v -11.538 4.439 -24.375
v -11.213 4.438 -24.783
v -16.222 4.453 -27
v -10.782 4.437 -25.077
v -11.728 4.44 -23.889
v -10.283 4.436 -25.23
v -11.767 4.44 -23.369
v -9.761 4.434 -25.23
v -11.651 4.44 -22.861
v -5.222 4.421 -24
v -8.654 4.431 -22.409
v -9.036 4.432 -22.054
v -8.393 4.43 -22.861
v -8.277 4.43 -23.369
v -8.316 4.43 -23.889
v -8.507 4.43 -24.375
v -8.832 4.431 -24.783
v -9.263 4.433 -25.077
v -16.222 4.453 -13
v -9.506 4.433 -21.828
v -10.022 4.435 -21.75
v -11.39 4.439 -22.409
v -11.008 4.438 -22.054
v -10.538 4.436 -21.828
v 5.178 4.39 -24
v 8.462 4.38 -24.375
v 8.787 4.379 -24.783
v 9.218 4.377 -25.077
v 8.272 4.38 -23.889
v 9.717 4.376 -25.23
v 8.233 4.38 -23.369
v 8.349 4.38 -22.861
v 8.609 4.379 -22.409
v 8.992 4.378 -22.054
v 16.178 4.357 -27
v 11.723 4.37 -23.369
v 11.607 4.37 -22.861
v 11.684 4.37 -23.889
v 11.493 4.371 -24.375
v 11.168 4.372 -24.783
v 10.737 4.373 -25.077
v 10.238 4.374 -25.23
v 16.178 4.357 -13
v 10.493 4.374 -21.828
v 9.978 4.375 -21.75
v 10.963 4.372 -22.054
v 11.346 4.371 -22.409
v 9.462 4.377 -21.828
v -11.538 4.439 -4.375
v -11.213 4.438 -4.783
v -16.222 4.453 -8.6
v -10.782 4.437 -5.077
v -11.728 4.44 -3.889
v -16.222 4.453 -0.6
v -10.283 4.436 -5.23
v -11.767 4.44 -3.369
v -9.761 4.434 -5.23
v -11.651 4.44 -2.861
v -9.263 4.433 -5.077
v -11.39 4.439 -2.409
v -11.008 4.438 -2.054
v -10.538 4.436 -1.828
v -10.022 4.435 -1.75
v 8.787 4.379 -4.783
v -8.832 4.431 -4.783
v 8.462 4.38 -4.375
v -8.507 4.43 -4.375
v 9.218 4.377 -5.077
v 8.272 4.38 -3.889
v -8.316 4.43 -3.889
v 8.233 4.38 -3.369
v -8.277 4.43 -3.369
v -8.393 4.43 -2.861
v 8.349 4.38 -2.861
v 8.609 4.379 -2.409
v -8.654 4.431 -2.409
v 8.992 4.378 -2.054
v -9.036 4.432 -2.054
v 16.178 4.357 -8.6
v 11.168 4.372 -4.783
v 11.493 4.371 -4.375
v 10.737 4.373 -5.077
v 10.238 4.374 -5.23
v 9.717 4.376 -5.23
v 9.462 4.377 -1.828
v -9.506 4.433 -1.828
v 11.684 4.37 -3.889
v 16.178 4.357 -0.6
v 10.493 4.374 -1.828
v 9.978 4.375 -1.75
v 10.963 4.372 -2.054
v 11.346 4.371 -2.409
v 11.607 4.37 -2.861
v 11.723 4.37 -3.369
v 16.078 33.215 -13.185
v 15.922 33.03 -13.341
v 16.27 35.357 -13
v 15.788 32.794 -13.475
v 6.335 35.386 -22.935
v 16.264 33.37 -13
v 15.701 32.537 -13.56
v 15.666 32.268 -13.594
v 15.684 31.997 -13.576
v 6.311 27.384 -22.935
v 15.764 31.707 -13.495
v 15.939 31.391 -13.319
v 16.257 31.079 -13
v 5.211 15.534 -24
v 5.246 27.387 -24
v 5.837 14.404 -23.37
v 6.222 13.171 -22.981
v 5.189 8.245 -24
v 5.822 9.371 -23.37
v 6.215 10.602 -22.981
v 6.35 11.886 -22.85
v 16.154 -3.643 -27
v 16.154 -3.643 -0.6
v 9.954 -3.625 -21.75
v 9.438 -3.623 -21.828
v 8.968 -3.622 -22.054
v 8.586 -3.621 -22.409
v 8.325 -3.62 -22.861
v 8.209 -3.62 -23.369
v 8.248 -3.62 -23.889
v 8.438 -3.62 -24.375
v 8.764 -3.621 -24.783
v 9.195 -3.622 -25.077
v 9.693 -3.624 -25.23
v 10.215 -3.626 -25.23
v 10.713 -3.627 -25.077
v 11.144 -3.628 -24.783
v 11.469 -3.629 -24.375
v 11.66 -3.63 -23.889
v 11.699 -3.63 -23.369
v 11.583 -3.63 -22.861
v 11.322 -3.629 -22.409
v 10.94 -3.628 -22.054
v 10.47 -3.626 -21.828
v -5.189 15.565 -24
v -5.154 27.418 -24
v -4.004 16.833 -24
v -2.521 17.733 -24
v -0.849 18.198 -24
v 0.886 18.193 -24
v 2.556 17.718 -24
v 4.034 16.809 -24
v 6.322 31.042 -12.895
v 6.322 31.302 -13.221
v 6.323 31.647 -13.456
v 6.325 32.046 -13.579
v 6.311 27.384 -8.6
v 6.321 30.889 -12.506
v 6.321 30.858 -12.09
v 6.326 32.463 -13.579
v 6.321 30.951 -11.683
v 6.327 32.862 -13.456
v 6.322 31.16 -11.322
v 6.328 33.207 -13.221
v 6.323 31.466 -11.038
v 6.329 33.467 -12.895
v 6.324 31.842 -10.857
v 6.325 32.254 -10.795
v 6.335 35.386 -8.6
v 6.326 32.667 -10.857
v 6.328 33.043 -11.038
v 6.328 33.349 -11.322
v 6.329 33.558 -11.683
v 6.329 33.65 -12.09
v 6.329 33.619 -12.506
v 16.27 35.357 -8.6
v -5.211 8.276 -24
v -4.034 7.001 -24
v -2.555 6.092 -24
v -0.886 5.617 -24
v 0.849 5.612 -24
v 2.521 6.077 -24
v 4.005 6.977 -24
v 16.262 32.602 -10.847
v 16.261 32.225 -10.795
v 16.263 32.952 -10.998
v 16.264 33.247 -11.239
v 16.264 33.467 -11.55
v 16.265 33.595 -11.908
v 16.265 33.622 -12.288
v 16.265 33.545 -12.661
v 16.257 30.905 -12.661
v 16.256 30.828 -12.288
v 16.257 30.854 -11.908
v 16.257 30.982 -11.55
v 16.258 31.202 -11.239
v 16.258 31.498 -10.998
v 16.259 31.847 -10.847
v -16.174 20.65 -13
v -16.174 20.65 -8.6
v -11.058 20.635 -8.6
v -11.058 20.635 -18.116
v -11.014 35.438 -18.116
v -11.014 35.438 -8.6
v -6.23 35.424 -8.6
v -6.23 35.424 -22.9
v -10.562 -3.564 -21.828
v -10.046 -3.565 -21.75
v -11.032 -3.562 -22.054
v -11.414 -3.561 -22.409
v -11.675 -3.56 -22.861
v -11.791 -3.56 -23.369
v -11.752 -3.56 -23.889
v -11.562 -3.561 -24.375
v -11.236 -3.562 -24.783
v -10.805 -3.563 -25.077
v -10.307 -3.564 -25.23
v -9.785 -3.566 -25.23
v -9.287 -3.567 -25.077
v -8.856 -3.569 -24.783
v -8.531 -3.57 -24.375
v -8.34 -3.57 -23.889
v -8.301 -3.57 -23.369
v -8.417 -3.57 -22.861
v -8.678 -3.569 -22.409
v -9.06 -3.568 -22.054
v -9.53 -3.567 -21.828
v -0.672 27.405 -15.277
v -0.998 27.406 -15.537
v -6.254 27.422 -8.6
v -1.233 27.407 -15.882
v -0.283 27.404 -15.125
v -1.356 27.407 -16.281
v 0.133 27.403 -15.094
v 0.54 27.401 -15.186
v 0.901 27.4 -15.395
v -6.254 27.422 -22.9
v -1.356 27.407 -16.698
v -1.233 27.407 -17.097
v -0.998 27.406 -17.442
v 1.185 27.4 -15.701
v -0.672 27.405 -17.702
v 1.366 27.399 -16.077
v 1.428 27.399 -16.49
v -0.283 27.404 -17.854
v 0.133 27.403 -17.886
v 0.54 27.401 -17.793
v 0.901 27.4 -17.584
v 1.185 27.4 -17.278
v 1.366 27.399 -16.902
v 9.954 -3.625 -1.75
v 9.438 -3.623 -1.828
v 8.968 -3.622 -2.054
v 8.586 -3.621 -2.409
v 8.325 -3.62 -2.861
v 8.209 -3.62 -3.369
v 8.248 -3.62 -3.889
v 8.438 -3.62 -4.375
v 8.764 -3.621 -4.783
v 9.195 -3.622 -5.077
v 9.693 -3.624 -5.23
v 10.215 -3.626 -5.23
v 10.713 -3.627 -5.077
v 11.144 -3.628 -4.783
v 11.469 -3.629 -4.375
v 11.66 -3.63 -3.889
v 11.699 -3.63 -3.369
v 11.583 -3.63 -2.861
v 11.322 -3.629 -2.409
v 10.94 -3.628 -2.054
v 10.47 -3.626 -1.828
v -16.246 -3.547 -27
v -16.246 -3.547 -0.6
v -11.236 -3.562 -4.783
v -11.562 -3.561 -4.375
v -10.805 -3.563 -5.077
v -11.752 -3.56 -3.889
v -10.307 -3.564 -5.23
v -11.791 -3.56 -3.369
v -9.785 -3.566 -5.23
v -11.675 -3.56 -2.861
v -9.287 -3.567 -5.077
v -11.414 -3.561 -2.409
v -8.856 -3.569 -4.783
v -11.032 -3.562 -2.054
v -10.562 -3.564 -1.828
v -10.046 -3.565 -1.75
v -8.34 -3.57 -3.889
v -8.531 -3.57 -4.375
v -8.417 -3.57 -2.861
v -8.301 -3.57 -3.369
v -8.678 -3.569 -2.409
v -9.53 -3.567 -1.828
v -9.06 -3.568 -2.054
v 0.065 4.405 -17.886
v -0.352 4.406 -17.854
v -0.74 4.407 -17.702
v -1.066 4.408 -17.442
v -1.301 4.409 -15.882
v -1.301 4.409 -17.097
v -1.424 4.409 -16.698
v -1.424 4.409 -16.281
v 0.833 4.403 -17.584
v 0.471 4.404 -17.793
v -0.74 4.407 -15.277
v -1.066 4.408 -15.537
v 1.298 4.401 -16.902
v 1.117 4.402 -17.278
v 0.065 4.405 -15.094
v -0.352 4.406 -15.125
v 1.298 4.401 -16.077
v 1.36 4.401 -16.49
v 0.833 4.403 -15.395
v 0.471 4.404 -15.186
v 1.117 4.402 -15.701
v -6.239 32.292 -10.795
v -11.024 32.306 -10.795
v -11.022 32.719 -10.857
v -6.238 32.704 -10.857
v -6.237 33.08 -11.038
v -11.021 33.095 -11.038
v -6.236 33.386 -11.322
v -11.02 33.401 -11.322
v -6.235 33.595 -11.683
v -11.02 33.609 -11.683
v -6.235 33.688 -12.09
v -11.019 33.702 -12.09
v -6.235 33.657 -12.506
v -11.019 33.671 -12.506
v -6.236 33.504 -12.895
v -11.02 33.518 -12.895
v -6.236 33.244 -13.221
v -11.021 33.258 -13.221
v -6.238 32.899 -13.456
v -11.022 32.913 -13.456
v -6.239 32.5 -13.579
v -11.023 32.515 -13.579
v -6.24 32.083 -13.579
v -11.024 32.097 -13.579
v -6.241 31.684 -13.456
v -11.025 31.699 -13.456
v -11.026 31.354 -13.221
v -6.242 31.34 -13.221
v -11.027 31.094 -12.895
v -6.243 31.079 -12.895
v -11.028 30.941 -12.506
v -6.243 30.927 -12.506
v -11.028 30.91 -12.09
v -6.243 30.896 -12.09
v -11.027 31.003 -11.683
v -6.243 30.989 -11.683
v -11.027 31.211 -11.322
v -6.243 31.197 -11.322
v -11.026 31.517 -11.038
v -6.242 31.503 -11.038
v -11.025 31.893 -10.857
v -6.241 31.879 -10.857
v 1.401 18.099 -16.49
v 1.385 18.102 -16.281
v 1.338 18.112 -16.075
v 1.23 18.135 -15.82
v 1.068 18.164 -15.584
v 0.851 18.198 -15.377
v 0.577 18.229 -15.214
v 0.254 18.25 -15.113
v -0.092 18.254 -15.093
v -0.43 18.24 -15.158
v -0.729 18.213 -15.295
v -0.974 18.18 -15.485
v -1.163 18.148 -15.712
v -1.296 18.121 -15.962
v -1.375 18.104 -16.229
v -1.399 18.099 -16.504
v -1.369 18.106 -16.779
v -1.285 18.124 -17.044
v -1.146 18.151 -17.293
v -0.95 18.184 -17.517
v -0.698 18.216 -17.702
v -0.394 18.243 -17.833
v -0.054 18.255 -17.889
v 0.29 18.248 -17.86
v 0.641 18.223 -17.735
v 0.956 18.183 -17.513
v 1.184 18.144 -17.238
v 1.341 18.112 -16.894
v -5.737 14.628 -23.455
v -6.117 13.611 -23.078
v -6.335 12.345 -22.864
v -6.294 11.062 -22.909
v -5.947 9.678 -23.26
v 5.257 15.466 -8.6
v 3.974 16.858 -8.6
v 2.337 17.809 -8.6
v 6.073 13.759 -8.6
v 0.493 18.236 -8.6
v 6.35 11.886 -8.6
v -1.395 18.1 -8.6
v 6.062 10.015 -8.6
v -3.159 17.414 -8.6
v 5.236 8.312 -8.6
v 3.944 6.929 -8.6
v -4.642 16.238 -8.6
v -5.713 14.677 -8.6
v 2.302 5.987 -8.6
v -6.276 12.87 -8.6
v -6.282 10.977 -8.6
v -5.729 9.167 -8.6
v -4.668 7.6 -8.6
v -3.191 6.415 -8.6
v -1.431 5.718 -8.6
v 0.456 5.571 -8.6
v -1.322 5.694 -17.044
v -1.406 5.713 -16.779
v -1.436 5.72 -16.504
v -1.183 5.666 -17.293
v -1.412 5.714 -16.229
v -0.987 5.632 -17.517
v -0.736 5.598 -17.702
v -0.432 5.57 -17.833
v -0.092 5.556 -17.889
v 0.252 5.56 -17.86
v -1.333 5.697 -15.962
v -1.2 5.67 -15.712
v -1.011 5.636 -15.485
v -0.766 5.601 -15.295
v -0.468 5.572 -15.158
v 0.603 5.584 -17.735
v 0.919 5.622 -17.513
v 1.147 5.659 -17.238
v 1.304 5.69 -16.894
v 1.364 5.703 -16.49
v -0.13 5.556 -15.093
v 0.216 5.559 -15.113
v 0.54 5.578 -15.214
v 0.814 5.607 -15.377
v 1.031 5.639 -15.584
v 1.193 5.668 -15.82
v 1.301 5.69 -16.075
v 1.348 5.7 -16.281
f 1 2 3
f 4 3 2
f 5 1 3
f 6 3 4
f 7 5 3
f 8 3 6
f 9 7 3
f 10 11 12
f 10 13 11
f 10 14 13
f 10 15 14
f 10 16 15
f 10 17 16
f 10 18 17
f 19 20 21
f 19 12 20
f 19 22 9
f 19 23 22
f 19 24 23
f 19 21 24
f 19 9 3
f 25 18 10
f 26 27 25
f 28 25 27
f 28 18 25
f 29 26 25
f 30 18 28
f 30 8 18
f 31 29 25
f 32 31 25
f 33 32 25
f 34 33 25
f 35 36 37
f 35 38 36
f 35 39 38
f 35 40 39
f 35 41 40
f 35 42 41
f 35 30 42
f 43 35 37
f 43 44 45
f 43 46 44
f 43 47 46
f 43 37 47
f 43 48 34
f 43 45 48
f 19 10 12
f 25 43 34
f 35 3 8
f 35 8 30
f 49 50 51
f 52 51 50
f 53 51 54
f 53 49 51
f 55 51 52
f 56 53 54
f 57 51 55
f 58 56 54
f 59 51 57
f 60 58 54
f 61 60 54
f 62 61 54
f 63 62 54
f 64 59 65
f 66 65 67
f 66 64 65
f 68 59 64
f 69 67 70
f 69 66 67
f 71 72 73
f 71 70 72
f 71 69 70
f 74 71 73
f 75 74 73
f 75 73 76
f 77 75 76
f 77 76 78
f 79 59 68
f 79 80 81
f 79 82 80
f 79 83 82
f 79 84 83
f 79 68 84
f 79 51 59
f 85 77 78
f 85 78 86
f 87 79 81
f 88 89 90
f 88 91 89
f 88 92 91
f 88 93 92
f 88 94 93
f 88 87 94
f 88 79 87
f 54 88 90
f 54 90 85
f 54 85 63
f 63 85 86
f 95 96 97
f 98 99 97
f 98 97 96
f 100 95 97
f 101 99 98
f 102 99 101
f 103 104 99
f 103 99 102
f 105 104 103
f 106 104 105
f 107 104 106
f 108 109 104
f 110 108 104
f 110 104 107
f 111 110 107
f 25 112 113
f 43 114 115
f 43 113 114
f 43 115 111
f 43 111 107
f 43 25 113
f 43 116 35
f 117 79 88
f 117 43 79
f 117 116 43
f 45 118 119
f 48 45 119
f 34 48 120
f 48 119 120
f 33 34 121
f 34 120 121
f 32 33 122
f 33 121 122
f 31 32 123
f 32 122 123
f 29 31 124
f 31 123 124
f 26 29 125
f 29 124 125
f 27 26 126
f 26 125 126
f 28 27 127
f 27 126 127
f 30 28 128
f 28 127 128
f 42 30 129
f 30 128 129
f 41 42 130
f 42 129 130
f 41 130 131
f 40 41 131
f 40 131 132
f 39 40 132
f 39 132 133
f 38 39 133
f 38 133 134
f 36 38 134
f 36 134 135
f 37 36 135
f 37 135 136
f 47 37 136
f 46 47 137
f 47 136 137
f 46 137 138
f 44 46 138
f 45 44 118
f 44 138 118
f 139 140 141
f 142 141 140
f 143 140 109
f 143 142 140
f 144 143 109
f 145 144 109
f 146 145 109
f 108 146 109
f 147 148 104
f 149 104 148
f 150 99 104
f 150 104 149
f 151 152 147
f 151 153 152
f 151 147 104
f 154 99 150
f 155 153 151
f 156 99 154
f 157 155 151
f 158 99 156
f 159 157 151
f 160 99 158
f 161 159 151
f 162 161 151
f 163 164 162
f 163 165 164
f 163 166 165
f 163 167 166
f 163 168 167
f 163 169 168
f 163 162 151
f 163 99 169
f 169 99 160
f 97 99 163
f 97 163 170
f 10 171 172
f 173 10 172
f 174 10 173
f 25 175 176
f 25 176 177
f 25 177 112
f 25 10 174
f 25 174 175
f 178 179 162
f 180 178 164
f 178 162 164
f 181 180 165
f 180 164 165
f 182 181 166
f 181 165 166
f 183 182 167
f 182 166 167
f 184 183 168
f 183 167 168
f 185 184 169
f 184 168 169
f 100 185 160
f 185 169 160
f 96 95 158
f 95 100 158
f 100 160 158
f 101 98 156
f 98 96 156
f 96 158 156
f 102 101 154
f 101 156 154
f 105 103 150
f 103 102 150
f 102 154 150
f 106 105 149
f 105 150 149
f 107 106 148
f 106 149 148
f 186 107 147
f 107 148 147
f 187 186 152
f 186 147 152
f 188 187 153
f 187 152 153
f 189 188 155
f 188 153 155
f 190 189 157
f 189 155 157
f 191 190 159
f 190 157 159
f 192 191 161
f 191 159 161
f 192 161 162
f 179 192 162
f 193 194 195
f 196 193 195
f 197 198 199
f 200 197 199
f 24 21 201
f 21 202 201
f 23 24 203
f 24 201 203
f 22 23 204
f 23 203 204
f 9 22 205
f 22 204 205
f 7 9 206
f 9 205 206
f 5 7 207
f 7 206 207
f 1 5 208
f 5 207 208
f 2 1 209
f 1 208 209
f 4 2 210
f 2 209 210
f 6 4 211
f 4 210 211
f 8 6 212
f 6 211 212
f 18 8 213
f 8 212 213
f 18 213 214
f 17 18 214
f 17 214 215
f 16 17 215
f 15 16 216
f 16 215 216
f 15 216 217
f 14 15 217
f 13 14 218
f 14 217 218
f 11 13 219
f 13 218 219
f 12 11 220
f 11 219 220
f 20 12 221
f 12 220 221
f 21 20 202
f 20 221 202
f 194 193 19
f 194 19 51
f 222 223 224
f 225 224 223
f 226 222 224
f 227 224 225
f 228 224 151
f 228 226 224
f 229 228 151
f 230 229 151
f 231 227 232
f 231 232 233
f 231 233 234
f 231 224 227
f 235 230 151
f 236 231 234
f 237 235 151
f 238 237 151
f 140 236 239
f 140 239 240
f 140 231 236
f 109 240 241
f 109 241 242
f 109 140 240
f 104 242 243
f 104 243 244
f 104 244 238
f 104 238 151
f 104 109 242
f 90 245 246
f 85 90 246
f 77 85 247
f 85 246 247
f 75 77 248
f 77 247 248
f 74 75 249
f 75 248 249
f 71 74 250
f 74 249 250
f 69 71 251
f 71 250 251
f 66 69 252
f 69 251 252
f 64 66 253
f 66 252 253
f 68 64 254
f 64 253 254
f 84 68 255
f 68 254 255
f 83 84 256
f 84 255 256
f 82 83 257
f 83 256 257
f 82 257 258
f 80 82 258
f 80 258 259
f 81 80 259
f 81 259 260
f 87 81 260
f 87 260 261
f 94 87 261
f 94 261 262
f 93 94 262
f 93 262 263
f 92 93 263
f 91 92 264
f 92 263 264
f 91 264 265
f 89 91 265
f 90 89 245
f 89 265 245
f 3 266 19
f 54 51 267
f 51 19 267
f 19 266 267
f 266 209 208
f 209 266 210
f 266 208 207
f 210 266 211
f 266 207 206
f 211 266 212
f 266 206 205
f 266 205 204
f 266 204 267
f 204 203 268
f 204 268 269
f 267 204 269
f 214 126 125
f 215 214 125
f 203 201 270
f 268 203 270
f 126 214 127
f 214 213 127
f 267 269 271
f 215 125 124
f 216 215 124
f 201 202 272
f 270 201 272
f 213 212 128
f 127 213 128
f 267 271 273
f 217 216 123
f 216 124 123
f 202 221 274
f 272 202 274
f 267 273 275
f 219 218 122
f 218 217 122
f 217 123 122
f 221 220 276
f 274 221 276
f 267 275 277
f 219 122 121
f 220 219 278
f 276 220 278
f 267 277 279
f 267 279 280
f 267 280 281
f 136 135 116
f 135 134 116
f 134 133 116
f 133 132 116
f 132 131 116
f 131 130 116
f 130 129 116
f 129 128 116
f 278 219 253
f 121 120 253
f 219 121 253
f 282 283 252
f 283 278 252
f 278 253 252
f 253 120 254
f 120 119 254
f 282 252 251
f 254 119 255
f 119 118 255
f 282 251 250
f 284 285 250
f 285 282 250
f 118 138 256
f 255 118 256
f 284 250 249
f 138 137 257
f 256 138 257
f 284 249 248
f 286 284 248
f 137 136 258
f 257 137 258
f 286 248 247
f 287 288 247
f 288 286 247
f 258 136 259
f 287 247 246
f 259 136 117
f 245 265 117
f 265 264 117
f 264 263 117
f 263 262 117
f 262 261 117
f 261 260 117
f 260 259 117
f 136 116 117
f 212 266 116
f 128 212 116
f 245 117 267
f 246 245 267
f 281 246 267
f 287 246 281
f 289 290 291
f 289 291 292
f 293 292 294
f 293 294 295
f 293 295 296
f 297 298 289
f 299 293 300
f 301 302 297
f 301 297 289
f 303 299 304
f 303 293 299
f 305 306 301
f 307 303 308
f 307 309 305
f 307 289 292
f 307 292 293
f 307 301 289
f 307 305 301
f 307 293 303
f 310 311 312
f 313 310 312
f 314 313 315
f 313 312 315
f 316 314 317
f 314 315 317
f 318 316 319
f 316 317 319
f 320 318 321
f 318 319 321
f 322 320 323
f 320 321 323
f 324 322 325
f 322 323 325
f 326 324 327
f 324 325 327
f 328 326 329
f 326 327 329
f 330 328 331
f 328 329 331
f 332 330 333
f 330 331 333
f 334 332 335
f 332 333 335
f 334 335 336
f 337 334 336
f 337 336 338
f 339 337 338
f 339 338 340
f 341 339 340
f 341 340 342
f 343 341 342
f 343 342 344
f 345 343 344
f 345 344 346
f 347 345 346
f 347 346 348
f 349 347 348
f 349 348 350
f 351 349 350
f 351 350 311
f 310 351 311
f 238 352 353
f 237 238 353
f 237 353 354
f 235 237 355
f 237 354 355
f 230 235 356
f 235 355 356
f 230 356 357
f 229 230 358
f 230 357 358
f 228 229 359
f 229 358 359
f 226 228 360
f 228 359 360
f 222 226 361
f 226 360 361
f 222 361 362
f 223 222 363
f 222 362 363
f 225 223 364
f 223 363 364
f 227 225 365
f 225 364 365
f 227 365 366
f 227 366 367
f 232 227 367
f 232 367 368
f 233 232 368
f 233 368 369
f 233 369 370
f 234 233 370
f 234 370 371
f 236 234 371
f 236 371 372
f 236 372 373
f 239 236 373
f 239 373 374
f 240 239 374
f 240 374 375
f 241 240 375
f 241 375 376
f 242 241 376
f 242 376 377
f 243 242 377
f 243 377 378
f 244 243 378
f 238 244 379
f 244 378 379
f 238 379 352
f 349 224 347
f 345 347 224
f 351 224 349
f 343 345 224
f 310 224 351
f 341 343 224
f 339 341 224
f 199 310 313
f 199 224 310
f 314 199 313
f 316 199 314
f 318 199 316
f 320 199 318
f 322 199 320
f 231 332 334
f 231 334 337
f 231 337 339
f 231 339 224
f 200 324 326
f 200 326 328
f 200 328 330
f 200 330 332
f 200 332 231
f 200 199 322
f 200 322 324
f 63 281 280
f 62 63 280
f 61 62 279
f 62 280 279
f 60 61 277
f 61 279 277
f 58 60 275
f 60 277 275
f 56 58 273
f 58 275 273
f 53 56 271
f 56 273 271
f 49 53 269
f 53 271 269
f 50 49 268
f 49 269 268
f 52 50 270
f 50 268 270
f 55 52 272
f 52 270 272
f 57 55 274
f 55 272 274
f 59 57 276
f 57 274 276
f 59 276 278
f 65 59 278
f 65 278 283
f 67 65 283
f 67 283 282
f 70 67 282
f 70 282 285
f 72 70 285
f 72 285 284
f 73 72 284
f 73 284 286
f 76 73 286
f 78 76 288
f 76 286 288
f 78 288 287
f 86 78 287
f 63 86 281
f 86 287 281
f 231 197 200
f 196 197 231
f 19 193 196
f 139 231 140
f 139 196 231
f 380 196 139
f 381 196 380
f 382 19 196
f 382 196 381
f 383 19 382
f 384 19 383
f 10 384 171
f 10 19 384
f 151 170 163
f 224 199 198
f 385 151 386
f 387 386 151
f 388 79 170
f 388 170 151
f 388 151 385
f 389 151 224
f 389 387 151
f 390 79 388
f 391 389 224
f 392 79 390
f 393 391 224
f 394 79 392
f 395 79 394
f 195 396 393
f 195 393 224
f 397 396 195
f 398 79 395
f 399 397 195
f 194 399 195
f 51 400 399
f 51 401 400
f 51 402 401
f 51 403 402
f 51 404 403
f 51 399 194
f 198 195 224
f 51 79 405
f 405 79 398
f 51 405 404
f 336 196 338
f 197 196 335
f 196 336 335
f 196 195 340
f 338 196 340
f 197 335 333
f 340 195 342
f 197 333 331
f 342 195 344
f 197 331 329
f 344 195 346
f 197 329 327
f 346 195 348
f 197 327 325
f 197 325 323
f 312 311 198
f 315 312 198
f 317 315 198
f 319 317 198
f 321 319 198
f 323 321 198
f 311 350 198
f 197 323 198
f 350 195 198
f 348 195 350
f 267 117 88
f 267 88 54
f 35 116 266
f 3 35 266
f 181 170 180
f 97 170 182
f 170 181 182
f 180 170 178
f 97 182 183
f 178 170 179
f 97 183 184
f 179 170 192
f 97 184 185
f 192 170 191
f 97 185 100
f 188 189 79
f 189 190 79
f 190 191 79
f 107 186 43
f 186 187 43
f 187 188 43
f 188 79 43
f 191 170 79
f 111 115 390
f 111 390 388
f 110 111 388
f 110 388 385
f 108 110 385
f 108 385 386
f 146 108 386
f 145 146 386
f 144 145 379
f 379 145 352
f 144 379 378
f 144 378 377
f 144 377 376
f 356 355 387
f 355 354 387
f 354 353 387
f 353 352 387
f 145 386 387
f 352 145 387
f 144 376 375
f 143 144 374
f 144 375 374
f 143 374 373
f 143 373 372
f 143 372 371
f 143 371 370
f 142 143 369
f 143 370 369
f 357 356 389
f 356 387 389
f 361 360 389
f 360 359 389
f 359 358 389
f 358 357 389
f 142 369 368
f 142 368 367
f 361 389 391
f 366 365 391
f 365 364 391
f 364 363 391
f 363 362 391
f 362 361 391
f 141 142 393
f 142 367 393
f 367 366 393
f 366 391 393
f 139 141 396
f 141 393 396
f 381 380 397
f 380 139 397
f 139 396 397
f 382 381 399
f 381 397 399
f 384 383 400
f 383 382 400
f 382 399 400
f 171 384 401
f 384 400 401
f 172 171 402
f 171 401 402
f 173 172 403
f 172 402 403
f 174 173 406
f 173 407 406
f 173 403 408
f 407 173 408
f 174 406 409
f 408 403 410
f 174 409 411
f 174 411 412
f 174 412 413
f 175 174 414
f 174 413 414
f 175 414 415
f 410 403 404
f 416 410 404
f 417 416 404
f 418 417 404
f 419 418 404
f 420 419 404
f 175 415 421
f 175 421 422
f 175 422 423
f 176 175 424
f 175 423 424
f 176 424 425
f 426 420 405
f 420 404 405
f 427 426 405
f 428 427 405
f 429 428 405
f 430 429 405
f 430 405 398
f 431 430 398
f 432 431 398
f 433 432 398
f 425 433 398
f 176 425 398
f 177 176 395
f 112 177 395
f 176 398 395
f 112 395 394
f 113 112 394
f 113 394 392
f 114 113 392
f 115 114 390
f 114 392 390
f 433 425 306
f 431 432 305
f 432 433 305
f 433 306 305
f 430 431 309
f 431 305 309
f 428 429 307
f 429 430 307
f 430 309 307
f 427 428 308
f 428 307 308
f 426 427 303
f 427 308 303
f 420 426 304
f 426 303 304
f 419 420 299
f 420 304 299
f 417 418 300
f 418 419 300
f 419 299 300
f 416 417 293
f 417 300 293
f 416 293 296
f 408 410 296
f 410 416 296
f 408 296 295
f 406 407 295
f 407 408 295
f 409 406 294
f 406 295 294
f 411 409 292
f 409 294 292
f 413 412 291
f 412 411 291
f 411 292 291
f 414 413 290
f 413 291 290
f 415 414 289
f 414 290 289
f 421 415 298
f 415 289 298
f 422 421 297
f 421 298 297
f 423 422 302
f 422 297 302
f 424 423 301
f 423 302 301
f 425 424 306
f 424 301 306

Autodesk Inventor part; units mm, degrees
ref_plane "YZ Plane" through (0, 0, 0) normal (1, 0, 0) x (0, 1, 0)
ref_plane "Work Plane5" through (16.1538, -3.6432, -7.1) normal (0.0029789, 0.9999956, 0) x (0, 0, 1)
sketch "Sketch5" plane through (16.1538, -3.6432, -7.1) normal (0.0029789, 0.9999956, 0) x (0, 0, 1)
  circle A0 centre (-16.4, -26.2) radius 1.75 projected
  circle A1 centre (-16.4, -6.2) radius 1.75 projected
  line L0 (0, -32.4) -> (6.5, -32.4) projected
  line L1 (6.5, 0) -> (6.5, -32.4) projected
  line L2 (0, 0) -> (6.5, 0) projected
  line L3 (0, 0) -> (0, -32.4) projected
  circle A2 centre (3.6, -6.2) radius 1.75 projected
  circle A3 centre (3.6, -26.2) radius 1.75 projected
  line L4 (-19.9, 0) -> (-19.9, -32.4) projected
  line L5 (6.5, -32.4) -> (-19.9, -32.4)
  line L6 (-19.9, -32.4) -> (-19.9, 0)
  line L7 (-19.9, 0) -> (6.5, 0)
  line L8 (6.5, 0) -> (6.5, -32.4)
  point P0 (7.1, -16.1645)
extrude "Extrusion4" add sketch "Sketch5" along normal blind 8
sketch "Sketch7" plane through (16.1776, 4.3568, -7.1) normal (0.0029789, 0.9999956, 0) x (0.9999956, -0.0029789, 0)
  point P0 (-16.1645, -7.1)
sketch "Sketch8" plane through (16.1776, 4.3568, -7.1) normal (0.0029789, 0.9999956, 0) x (0.9999956, -0.0029789, 0)
  circle A0 centre (-26.2, -3.6) radius 1.75 projected
  circle A1 centre (-6.2, -3.6) radius 1.75 projected
  circle A2 centre (-6.2, 16.4) radius 1.75 projected
  circle A3 centre (-26.2, 16.4) radius 1.75 projected
  line L0 (-32.4, -6.5) -> (0, -6.5) projected
  line L1 (0, -6.5) -> (0, 19.9) projected
  line L2 (0, 19.9) -> (-32.4, 19.9) projected
  line L3 (-32.4, 19.9) -> (-32.4, -6.5) projected
  circle A4 centre (-16.2177, 39.3896) radius 1.75 projected
  line L4 (-22.2006, -0.6104) -> (-22.0458, -0.6104) projected
  line L5 (-22.2, -0.6104) -> (-22.2, -0.6104) projected
  line L6 (-22.2, -0.6104) -> (-21.7015, -0.6104) projected
  line L7 (-21.7015, -0.6104) -> (-14.6224, -0.6104) projected
  line L8 (-14.6224, -0.6104) -> (-13.8248, -0.6104) projected
  line L9 (-13.8248, -0.6104) -> (-10.7339, -0.6104) projected
  line L10 (-10.7339, -0.6104) -> (-10.2354, -0.6104) projected
  line L11 (-10.2354, -0.6104) -> (-10.2354, -0.6104) projected
  line L12 (-10.3901, -0.6104) -> (-10.2354, -0.6104) projected
  line L13 (-10.966, -0.6104) -> (-10.3901, -0.6104) projected
  line L14 (-11.1588, -0.6104) -> (-10.966, -0.6104) projected
  line L15 (-11.1588, -0.6104) -> (-11.5034, -0.6104) projected
  line L16 (-11.731, -0.6104) -> (-11.5034, -0.6104) projected
  line L17 (-11.731, -0.6104) -> (-11.731, -0.6104) projected
  line L18 (-11.731, -0.6104) -> (-11.5034, -0.6104) projected
  line L19 (-11.5034, -0.6104) -> (-11.1379, -0.6104) projected
  line L20 (-11.1379, -0.6104) -> (-10.9487, -0.6104) projected
  line L21 (-10.9487, -0.6104) -> (-10.3901, -0.6104) projected
  line L22 (-10.3901, -0.6104) -> (-10.2354, -0.6104) projected
  line L23 (-10.2354, -0.6104) -> (-10.2354, -0.6104) projected
  line L24 (-10.2354, -0.6104) -> (-10.7339, -0.6104) projected
  line L25 (-10.7339, -0.6104) -> (-21.7015, -0.6104) projected
  line L26 (-21.7015, -0.6104) -> (-22.2, -0.6104) projected
  line L27 (-22.2, -0.6104) -> (-22.2, -0.6104) projected
  line L28 (-22.2001, -0.6104) -> (-22.0454, -0.6104) projected
  line L29 (-22.0454, -0.6104) -> (-21.4867, -0.6104) projected
  line L30 (-21.4867, -0.6104) -> (-21.2975, -0.6104) projected
  line L31 (-21.2975, -0.6104) -> (-20.932, -0.6104) projected
  line L32 (-20.932, -0.6104) -> (-20.7045, -0.6104) projected
  line L33 (-20.7045, -0.6104) -> (-20.7045, -0.6104) projected
  line L34 (-20.932, -0.6104) -> (-20.7045, -0.6104) projected
  line L35 (-20.932, -0.6104) -> (-21.2766, -0.6104) projected
  line L36 (-21.4694, -0.6104) -> (-21.2766, -0.6104) projected
  line L37 (-22.0458, -0.6104) -> (-21.4694, -0.6104) projected
  line L38 (-32.4, 19.9) -> (-32.4, -6.5) projected
  line L39 (-32.4, 5.9) -> (-21.4, 16.9)
  line L40 (-21.4, 16.9) -> (-11, 16.9)
  line L41 (-11, 16.9) -> (0, 5.9)
  line L42 (0, -6.5) -> (0, 19.9) projected
  line L43 (0, 1.5) -> (-32.4, 1.5)
  line L44 (-32.4, 5.9) -> (-32.4, -0.0368)
  line L45 (0, 5.9) -> (0, 1.5)
  circle A5 centre (-16.2177, 9.3896) radius 1.75
  circle A6 centre (-16.2177, 9.3896) radius 1.4
  point P0 (-16.1645, -7.1)
  dimension "d25" = 45
  dimension "d26" = 45
  dimension "d27" = 3
  dimension "d28" = 11
  dimension "d29" = 11
  dimension "d30" = 8
  dimension "d46" = 2.8
ref_plane "Work Plane7" through (-5.4512, 35.4213, -181.4907) normal (0.0029789, 0.9999956, 0) x (0, 0, 1)
extrude "Extrusion5" add sketch "Sketch8" along normal up to surface (31 mm away) contours L43 L3 L39 L40 L41 L1 | A5
sketch "Sketch9" plane through (16.2699, 35.3566, -8.6) normal (0.0029789, 0.9999956, 0) x (0.9999956, -0.0029789, 0)
  line L0 (-22.2, -2.1104) -> (-22.2, 197.8896) projected
  line L1 (-10.2354, -2.1104) -> (-10.2354, 197.8896) projected
  line L2 (-22.5, 20.2984) -> (-9.9354, 20.2984)
  line L3 (-9.9354, 20.2984) -> (-9.9354, -1.0464)
  line L4 (-9.9354, -1.0464) -> (-22.5, -1.0464)
  line L5 (-22.5, -1.0464) -> (-22.5, 20.2984)
  point P0 (-16.1645, -8.6)
  dimension "d34" = 0.3
  dimension "d35" = 0.3
ref_plane "Work Plane8" through (-5.4751, 27.4214, -181.4903) normal (-0.0029789, -0.9999956, 0) x (0.9999956, -0.0029789, 0)
extrude "Extrusion6" cut sketch "Sketch9" against normal up to surface (8 mm away)
sketch "Sketch10" plane through (-16.2461, -3.5467, -27) normal (-0.9999956, 0.0029789, 0) x (0, 0, 1)
  line L0 (0, 0) -> (26.4, 0) projected
  line L1 (26.4, 0) -> (26.4, 8) projected
  line L2 (18.4, 8) -> (26.4, 8) projected
  line L3 (0, 0) -> (0, 8) projected
  circle A0 centre (14.8051, 35.8681) radius 1.4
  line L4 (18.4, 8) -> (18.4, 39) projected
  line L5 (18.4, 39) -> (14, 39) projected
  line L6 (14, 8) -> (14, 39) projected
  line L7 (0, 8) -> (14, 8) projected
  point P0 (27, 3.595)
  dimension "d38" = 2.8
extrude "Extrusion7" cut sketch "Sketch10" against normal through all contours L6 A0 | A0 L6
sketch "Sketch11" plane through (-16.2223, 4.4533, -8.6) normal (0, 0, 1) x (0.9999956, -0.0029789, 0)
  circle A0 centre (16.2, 7.5) radius 5.65 projected
  circle A1 centre (16.2, 7.5) radius 6.35
  point P0 (16.2355, -4.405)
  dimension "d41" = 0.7
extrude "Extrusion8" cut sketch "Sketch11" against normal through all contours A0 | A1
sketch "Sketch12" plane through (-16.2223, 4.4533, -8.6) normal (0, 0, 1) x (0.9999956, -0.0029789, 0)
  line L0 (3.2, 25.4) -> (-3.8, 25.4) projected
  line L1 (3.2, 25.4) -> (3.2, 69.4) projected
  line L2 (-3.8, 69.4) -> (3.2, 69.4) projected
  line L3 (3.2, 18.4) -> (3.2, 26.4) projected
  line L4 (-2.7347, 16.1972) -> (5.1158, 16.1972)
  line L5 (5.1158, 16.1972) -> (5.1158, 65.2014)
  line L6 (5.1158, 65.2014) -> (-2.7347, 65.2014)
  line L7 (-2.7347, 65.2014) -> (-2.7347, 16.1972)
  line L8 (-3.8, 25.4) -> (-3.8, 69.4) projected
  line L9 (-3.8, 18.4) -> (3.2, 18.4) projected
  line L10 (-3.8, 26.4) -> (-3.8, 18.4) projected
  line L11 (3.2, 26.4) -> (-3.8, 26.4) projected
  point P0 (16.2355, -4.405)
  point P1 (-1.8, 18.4)
  point P2 (-1.8, 26.4)
extrude "Extrusion9" cut sketch "Sketch12" against normal through all contours L3 L9 L7 L0 | L0 L7 L11 L1 | L1 L6 L5 L4 L7 L9 L3 | L11 L7 L6 L1
properties part number "03_Support_Xslide"
